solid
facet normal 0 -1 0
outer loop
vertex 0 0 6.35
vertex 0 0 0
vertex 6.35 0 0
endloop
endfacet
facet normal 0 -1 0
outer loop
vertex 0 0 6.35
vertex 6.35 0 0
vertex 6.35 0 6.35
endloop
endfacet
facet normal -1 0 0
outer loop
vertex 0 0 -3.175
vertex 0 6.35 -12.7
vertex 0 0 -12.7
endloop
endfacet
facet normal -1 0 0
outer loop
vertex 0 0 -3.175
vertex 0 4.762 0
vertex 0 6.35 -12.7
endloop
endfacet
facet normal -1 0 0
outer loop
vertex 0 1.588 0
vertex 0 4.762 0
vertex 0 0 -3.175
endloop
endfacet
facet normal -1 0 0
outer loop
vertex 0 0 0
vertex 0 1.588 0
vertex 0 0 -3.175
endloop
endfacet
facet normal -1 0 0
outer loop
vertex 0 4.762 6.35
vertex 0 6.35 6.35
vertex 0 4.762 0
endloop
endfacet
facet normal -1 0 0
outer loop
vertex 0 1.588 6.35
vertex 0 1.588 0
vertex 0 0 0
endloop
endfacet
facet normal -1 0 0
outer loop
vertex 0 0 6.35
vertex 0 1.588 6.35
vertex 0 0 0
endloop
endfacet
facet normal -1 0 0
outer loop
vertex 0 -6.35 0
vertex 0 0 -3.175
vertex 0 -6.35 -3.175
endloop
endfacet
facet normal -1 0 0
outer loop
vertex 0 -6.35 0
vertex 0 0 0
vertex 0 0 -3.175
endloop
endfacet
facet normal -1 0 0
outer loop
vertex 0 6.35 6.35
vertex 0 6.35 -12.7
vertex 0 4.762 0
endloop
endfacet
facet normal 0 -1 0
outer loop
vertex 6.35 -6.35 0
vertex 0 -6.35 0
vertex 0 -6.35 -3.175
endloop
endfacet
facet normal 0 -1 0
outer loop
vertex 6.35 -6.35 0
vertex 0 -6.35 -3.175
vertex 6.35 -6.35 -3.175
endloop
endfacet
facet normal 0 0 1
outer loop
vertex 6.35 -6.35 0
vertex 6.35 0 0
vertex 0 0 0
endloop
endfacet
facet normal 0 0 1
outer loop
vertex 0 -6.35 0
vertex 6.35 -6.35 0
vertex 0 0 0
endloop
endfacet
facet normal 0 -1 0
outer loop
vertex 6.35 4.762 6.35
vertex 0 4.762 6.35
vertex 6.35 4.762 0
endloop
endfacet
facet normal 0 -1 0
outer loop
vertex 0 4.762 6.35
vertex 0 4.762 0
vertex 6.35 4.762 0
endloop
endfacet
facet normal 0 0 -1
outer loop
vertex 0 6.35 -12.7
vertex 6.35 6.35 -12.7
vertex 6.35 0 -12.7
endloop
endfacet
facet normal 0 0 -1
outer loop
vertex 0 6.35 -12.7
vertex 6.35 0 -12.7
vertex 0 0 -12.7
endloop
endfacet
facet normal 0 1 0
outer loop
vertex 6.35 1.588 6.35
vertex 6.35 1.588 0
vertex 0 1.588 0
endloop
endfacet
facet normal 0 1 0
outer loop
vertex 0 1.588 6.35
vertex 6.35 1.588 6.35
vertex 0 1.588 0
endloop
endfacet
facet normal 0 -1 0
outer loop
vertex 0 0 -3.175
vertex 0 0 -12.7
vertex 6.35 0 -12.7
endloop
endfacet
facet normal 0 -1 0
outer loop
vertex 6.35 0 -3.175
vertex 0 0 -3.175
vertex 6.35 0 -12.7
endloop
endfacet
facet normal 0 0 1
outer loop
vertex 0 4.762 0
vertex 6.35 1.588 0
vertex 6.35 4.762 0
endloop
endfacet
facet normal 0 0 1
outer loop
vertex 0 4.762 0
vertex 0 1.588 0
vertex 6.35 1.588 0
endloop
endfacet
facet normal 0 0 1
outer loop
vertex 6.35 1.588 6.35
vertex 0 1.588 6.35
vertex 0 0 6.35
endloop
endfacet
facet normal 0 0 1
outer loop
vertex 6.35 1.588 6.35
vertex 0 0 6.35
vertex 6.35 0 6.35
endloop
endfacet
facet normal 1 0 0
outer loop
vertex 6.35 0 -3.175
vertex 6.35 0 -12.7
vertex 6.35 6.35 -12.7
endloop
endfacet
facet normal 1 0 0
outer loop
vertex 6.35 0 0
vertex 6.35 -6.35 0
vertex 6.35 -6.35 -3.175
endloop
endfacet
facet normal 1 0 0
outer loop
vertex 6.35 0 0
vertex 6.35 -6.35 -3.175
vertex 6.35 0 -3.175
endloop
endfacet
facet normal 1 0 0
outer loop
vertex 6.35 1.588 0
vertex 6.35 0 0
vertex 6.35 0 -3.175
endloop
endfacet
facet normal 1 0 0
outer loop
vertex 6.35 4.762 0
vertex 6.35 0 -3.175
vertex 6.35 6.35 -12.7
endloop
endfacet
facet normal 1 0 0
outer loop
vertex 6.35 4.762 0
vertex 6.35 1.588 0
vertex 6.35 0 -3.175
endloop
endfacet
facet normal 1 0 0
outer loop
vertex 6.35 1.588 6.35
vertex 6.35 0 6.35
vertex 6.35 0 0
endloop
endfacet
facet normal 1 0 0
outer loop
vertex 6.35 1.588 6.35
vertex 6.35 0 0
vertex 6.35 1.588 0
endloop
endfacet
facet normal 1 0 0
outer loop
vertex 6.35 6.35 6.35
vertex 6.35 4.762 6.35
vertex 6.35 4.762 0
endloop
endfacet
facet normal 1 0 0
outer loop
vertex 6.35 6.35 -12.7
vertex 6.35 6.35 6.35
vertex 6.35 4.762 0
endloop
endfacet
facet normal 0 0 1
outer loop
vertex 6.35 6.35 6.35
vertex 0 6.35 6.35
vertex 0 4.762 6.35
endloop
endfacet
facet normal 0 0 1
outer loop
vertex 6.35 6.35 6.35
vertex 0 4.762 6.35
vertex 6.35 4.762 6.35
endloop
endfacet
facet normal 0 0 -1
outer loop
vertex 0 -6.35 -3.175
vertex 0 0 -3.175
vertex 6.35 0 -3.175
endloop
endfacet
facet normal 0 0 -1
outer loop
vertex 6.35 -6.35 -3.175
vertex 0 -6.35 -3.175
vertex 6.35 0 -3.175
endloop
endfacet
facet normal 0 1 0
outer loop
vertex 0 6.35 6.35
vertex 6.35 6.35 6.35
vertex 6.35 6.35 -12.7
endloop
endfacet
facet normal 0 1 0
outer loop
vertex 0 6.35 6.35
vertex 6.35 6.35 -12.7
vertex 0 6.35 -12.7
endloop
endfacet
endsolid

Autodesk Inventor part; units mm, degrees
ref_plane "YZ Plane" through (0, 0, 0) normal (1, 0, 0) x (0, 1, 0)
ref_plane "XZ Plane" through (0, 0, 0) normal (0, 1, 0) x (-1, 0, 0)
ref_plane "XY Plane" through (0, 0, 0) normal (0, 0, 1) x (1, 0, 0)
sketch "Sketch1" plane through (0, 0, 0) normal (1, 0, 0) x (0, 1, 0)
  line L0 (0, 0) -> (6.35, 0)
  line L1 (6.35, 0) -> (6.35, -6.35)
  line L2 (6.35, -6.35) -> (0, -6.35)
  line L3 (0, -6.35) -> (0, 0)
  dimension "d0" = 6.35
  dimension "d1" = 6.35
extrude "Extrusion1" add sketch "Sketch1" along normal blind 6.35
sketch "Sketch2" plane through (0, 0, 0) normal (0, 0, 1) x (1, 0, 0)
  line L0 (0, 0) -> (0, 6.35) projected
  line L1 (6.35, 6.35) -> (6.35, 0) projected
  line L2 (0, 4.7625) -> (6.35, 4.7625)
  line L3 (6.35, 4.7625) -> (6.35, 1.5875)
  line L4 (6.35, 1.5875) -> (0, 1.5875)
  line L5 (0, 1.5875) -> (0, 4.7625)
  line L6 (0, 0) -> (6.35, 0) projected
  line L7 (0, 1.5875) -> (0, 0)
  line L8 (0, 0) -> (6.35, 0)
  line L9 (6.35, 0) -> (6.35, 1.5875)
  line L10 (6.35, 4.7625) -> (6.35, 6.35)
  line L11 (0, 6.35) -> (6.35, 6.35) projected
  line L12 (0, 6.35) -> (0, 4.7625)
  line L13 (0, 6.35) -> (6.35, 6.35)
  dimension "d4" = 1.5875
  dimension "d5" = 3.175
extrude "Extrusion2" add sketch "Sketch2" along normal blind 6.35 contours L0 L4 L1 L6 | L0 L11 L1 L2
sketch "Sketch3" plane through (0, 0, -6.35) normal (0, -1, 0) x (1, 0, 0)
  line L0 (6.35, 0) -> (6.35, 12.7) projected
  line L1 (6.35, 6.35) -> (0, 6.35)
  line L2 (0, 6.35) -> (0, 3.175)
  line L3 (0, 3.175) -> (6.35, 3.175)
  line L4 (6.35, 3.175) -> (6.35, 6.35)
  dimension "d8" = 3.175
  dimension "d9" = 6.35
extrude "Extrusion3" add sketch "Sketch3" along normal blind 6.35
sketch "Sketch4" plane through (0, 0, -6.35) normal (0, 0, -1) x (-1, 0, 0)
  line L0 (0, 1.5875) -> (0, 0) projected
  line L1 (-6.35, 4.7625) -> (-6.35, 6.35) projected
  line L2 (0, 0) -> (-6.35, 0)
  line L3 (-6.35, 0) -> (-6.35, 6.35)
  line L4 (-6.35, 6.35) -> (0, 6.35)
  line L5 (0, 6.35) -> (0, 0)
extrude "Extrusion4" add sketch "Sketch4" along normal blind 6.35
properties part number "MonsterSupportHolder4"
